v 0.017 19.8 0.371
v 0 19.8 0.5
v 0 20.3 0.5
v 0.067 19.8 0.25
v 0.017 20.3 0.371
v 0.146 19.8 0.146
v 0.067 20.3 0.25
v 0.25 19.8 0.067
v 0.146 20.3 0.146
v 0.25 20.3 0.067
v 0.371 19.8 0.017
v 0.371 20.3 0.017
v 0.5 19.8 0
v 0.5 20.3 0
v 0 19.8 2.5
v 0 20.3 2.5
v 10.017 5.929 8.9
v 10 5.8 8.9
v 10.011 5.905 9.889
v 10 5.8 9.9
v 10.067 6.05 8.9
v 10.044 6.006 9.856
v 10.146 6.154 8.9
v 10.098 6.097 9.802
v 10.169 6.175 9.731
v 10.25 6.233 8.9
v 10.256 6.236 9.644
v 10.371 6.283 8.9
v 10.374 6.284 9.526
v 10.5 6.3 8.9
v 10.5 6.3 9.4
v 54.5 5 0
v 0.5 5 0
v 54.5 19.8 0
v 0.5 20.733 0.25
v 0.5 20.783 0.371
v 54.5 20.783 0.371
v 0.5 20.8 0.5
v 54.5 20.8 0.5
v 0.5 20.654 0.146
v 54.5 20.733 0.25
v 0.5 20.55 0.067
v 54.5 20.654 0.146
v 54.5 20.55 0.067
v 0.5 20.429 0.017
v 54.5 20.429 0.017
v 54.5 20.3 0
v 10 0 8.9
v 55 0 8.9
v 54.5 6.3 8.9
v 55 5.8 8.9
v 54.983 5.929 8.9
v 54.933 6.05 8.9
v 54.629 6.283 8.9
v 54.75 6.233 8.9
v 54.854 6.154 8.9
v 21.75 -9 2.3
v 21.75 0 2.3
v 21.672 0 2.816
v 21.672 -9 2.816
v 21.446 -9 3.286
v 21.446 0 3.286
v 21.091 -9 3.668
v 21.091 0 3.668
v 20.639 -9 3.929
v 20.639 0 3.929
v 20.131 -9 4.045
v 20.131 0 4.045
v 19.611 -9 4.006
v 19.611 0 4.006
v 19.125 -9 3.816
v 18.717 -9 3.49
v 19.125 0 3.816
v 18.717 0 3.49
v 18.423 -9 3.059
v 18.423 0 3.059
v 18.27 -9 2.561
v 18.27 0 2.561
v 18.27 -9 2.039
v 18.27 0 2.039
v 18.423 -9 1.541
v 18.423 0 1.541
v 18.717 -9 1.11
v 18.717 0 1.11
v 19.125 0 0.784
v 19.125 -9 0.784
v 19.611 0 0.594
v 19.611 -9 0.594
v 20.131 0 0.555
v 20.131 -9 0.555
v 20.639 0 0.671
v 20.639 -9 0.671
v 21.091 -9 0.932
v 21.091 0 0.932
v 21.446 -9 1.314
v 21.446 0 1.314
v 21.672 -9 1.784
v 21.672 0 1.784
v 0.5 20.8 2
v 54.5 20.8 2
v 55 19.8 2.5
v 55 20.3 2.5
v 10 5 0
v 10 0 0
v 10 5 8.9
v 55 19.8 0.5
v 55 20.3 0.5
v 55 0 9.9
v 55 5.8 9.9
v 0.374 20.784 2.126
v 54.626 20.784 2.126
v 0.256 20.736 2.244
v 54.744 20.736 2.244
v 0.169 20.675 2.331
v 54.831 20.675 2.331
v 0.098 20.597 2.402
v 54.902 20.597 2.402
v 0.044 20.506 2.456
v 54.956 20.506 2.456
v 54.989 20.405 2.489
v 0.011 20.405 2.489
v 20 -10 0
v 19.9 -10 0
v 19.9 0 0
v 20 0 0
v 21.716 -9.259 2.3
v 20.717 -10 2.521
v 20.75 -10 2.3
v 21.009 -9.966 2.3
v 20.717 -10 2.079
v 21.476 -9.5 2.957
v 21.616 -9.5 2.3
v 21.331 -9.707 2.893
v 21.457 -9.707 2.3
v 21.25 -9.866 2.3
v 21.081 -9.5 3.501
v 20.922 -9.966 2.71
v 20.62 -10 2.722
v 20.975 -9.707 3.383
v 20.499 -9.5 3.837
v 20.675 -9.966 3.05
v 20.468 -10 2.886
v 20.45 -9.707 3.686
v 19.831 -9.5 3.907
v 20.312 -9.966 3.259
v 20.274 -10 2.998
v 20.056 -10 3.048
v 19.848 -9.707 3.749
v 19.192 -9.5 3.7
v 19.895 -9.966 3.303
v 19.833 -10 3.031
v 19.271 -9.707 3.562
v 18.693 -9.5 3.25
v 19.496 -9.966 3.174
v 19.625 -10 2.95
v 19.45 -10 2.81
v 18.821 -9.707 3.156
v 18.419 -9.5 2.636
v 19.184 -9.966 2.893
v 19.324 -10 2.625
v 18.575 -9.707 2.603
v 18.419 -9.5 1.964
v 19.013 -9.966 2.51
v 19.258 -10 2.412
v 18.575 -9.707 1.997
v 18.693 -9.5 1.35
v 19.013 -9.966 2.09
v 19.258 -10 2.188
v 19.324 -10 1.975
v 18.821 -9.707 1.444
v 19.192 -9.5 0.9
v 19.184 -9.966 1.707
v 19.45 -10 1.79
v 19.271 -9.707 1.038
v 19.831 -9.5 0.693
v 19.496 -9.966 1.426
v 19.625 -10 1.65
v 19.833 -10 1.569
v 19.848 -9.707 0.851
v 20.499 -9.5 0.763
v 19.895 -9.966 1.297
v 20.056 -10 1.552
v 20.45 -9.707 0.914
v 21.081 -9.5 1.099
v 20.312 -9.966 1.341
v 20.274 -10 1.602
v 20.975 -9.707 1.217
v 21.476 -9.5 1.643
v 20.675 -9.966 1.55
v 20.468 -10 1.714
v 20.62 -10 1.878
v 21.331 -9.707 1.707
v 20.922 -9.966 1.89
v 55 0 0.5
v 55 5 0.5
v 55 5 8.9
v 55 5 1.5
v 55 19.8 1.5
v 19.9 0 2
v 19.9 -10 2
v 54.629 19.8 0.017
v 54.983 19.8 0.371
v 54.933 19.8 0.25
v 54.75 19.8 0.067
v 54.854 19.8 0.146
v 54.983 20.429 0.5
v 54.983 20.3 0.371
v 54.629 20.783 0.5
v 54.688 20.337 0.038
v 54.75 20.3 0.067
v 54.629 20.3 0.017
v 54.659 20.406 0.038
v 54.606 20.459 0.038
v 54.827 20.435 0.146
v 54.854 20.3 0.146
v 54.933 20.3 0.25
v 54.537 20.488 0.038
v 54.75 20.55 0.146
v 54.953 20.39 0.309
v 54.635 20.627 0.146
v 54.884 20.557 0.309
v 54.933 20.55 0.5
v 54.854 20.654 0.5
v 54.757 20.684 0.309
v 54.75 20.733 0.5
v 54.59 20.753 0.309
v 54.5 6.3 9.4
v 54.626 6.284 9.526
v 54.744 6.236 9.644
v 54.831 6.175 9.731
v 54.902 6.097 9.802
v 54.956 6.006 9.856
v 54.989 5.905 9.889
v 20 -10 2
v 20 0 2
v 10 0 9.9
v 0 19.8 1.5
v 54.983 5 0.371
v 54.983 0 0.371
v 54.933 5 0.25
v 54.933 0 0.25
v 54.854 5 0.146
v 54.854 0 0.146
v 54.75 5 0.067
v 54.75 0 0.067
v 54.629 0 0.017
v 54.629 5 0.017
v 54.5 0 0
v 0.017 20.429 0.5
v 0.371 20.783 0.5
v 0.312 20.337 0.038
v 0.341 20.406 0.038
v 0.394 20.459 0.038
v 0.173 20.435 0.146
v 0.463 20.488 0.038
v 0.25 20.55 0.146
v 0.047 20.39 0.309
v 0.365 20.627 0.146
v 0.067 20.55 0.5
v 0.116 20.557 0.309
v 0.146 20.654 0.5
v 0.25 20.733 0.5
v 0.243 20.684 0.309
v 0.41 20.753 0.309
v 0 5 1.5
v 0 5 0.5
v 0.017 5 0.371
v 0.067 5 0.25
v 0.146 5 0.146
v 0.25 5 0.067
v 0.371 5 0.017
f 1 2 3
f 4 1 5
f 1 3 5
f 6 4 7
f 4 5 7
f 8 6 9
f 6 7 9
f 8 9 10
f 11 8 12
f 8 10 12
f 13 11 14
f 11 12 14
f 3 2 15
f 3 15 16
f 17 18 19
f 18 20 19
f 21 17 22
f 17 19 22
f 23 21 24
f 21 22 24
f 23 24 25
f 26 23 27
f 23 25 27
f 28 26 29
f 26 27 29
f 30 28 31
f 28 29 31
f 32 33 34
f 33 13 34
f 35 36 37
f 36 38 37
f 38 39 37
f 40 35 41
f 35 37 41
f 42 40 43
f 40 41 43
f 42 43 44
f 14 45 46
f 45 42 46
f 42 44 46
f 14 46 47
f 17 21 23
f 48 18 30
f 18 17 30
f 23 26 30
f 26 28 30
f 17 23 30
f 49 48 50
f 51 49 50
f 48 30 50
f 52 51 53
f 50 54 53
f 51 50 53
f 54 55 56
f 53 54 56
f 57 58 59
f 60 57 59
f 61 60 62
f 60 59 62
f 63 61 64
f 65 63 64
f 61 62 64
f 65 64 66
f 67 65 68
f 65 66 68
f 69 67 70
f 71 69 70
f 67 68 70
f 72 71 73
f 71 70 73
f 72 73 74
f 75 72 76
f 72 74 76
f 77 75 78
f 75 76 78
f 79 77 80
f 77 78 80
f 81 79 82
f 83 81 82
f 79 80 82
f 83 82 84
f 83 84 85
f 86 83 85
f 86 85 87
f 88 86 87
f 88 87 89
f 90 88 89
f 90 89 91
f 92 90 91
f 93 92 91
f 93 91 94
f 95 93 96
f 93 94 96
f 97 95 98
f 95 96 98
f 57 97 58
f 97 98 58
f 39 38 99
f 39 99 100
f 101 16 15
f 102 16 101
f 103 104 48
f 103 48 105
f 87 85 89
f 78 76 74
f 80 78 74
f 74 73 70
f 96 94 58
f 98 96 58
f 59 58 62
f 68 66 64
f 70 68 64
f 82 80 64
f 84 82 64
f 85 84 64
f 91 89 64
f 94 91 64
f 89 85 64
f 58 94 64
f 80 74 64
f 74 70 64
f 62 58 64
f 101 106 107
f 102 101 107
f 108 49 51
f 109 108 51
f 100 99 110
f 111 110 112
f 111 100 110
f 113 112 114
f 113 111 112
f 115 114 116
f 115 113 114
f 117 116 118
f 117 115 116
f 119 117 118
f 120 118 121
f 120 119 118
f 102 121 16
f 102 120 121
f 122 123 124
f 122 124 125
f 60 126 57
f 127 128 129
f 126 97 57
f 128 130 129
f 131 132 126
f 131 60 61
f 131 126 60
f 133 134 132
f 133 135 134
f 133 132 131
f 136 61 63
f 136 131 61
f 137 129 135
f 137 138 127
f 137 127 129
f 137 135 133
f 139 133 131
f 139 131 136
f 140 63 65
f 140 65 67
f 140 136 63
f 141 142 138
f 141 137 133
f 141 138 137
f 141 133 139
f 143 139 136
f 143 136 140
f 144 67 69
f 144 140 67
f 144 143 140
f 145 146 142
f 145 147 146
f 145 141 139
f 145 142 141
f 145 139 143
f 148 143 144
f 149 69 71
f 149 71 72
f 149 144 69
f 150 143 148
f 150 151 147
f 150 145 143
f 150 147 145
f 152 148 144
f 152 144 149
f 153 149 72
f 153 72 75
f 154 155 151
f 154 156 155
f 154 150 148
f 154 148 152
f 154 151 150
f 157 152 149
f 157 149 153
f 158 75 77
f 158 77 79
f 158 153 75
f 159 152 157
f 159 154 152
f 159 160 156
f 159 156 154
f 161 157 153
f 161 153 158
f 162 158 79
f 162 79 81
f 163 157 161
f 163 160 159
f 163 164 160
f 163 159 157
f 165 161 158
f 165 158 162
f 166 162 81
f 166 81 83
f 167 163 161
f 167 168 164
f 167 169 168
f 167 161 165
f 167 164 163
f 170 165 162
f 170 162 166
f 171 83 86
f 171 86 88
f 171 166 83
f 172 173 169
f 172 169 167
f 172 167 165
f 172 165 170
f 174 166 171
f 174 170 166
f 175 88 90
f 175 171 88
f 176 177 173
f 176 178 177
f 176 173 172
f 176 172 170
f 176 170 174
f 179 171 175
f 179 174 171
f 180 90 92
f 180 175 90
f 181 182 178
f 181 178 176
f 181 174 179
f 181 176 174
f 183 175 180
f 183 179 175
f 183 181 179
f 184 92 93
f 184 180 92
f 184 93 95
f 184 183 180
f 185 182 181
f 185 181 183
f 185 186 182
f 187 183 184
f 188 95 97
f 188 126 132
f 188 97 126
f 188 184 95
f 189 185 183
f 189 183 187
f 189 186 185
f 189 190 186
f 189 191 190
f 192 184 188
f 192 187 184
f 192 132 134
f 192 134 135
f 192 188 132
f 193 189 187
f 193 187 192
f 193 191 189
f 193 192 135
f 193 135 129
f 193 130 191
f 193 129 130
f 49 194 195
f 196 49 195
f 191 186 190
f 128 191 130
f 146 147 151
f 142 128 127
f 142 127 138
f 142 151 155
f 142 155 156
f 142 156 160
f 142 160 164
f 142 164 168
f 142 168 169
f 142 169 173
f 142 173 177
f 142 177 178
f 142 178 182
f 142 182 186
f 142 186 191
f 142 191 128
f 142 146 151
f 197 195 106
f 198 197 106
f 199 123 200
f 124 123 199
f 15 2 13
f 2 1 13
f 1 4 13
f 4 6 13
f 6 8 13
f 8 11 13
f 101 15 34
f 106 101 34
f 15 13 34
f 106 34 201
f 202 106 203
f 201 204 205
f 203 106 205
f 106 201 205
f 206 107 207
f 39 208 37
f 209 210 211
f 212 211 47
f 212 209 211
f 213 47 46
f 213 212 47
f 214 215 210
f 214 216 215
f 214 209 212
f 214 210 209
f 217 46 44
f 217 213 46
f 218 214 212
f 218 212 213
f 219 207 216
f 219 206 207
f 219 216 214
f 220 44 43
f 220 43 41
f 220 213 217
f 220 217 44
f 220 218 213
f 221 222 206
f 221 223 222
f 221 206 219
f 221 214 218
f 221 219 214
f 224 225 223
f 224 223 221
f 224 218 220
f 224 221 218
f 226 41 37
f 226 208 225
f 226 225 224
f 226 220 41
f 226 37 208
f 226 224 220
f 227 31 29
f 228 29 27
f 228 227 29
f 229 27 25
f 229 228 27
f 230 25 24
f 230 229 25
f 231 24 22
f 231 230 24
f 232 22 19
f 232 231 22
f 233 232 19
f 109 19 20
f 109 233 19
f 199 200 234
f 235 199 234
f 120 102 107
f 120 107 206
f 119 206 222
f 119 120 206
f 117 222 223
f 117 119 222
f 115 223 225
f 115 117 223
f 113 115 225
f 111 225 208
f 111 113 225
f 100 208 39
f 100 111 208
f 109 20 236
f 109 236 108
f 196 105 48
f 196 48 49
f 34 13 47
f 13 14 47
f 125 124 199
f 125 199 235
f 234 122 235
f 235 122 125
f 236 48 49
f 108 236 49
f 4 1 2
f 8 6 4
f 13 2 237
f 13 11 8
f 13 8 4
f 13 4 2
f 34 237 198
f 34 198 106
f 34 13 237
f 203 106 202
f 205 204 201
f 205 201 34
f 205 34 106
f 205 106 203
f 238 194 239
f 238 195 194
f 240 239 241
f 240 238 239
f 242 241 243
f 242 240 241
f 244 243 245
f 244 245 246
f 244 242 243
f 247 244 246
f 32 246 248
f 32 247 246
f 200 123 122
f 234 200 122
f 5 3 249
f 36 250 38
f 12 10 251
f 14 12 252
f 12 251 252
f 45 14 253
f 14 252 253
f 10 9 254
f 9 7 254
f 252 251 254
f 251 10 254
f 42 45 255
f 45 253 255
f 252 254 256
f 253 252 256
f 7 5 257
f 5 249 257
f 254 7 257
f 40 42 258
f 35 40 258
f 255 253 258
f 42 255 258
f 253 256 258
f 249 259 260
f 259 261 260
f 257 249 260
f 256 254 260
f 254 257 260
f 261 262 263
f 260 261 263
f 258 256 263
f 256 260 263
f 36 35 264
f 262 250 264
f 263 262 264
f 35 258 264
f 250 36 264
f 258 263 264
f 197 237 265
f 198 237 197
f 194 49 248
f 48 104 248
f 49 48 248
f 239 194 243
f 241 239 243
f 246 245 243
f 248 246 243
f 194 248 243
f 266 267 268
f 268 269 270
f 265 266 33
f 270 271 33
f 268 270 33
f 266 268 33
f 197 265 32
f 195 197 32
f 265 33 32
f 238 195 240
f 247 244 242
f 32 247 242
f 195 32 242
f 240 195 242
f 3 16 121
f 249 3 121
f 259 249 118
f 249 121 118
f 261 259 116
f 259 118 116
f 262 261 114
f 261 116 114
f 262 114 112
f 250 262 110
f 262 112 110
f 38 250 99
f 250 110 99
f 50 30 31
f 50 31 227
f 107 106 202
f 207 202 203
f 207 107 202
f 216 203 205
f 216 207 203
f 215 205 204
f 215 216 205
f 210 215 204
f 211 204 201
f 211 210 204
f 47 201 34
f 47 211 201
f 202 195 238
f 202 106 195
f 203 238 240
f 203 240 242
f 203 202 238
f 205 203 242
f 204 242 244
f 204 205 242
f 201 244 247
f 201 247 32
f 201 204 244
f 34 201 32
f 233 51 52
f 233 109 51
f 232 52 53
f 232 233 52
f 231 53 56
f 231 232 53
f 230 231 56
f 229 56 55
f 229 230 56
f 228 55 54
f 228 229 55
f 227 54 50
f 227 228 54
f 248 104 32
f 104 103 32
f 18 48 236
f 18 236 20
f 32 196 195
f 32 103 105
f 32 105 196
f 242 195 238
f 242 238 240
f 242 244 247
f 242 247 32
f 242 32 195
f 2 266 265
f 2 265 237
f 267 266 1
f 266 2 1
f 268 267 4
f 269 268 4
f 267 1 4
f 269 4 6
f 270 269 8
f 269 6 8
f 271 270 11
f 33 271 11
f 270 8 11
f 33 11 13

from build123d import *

# Parameters (mm, degrees)
CYLINDER_R     = 1.75
CYLINDER_DEPTH = 10
FILLET_R       = 1
BOX002_W       = 55
BOX002_H       = 1
BOX002_DEPTH   = 2.5
FILLET001_R    = 0.5
BOX001_W       = 55
BOX001_H       = 14.8
BOX001_DEPTH   = 1.5
FILLET003_R    = 0.5
BOX_W          = 45
BOX_H          = 5
BOX_DEPTH      = 8.9
FILLET004_R    = 0.5
BOX003_W       = 45
BOX003_H       = 6.3
BOX003_DEPTH   = 1
FILLET005_R    = 0.5
BOX004_W       = 0.1
BOX004_H       = 10
BOX004_DEPTH   = 2


with BuildPart() as fillet_body:
    # Cylinder → Cylinder (new body)
    with BuildSketch(Plane(origin=(20, 0, 2.3), x_dir=(1, 0, 0), z_dir=(0, -1, 0))):
        Circle(CYLINDER_R)
    extrude(amount=CYLINDER_DEPTH)

    # Fillet
    fillet_edges = [fillet_body.edges().sort_by_distance(p)[0] for p in [
        (18.25, -10, 2.3),
    ]]
    fillet(fillet_edges, radius=FILLET_R)


with BuildPart() as fillet001:
    # Box002 → Box002 (new body)
    with BuildSketch(Plane(origin=(0, 19.8, 0), x_dir=(1, 0, 0), z_dir=(0, 0, 1))):
        with Locations((27.5, 0.5)):
            Rectangle(BOX002_W, BOX002_H)
    extrude(amount=BOX002_DEPTH)

    # Fillet001
    fillet001_edges = [fillet001.edges().sort_by_distance(p)[0] for p in [
        (0, 20.8, 1.25),
        (0, 20.3, 0),
        (55, 20.8, 1.25),
        (55, 20.3, 0),
        (27.5, 20.8, 0),
        (27.5, 20.8, 2.5),
    ]]
    fillet(fillet001_edges, radius=FILLET001_R)


with BuildPart() as fillet003:
    # Box001 → Box001 (new body)
    with BuildSketch(Plane(origin=(0, 5, 0), x_dir=(1, 0, 0), z_dir=(0, 0, 1))):
        with Locations((27.5, 7.4)):
            Rectangle(BOX001_W, BOX001_H)
    extrude(amount=BOX001_DEPTH)

    # Fillet003
    fillet003_edges = [fillet003.edges().sort_by_distance(p)[0] for p in [
        (0, 12.4, 0),
        (55, 12.4, 0),
    ]]
    fillet(fillet003_edges, radius=FILLET003_R)


with BuildPart() as fillet004:
    # Box → Box (new body)
    with BuildSketch(Plane(origin=(10, 0, 0), x_dir=(1, 0, 0), z_dir=(0, 0, 1))):
        with Locations((22.5, 2.5)):
            Rectangle(BOX_W, BOX_H)
    extrude(amount=BOX_DEPTH)

    # Fillet004
    fillet004_edges = [fillet004.edges().sort_by_distance(p)[0] for p in [
        (55, 2.5, 0),
    ]]
    fillet(fillet004_edges, radius=FILLET004_R)


with BuildPart() as fillet005:
    # Box003 → Box003 (new body)
    with BuildSketch(Plane(origin=(10, 0, 8.9), x_dir=(1, 0, 0), z_dir=(0, 0, 1))):
        with Locations((22.5, 3.15)):
            Rectangle(BOX003_W, BOX003_H)
    extrude(amount=BOX003_DEPTH)

    # Fillet005
    fillet005_edges = [fillet005.edges().sort_by_distance(p)[0] for p in [
        (10, 6.3, 9.4),
        (55, 6.3, 9.4),
        (32.5, 6.3, 9.9),
    ]]
    fillet(fillet005_edges, radius=FILLET005_R)


with BuildPart() as cube004:
    # Box004 → Box004 (new body)
    with BuildSketch(Plane(origin=(19.9, -10, 0), x_dir=(1, 0, 0), z_dir=(0, 0, 1))):
        with Locations((0.05, 5)):
            Rectangle(BOX004_W, BOX004_H)
    extrude(amount=BOX004_DEPTH)


solid = Compound([fillet_body.part, fillet001.part, fillet003.part, fillet004.part, fillet005.part, cube004.part])
